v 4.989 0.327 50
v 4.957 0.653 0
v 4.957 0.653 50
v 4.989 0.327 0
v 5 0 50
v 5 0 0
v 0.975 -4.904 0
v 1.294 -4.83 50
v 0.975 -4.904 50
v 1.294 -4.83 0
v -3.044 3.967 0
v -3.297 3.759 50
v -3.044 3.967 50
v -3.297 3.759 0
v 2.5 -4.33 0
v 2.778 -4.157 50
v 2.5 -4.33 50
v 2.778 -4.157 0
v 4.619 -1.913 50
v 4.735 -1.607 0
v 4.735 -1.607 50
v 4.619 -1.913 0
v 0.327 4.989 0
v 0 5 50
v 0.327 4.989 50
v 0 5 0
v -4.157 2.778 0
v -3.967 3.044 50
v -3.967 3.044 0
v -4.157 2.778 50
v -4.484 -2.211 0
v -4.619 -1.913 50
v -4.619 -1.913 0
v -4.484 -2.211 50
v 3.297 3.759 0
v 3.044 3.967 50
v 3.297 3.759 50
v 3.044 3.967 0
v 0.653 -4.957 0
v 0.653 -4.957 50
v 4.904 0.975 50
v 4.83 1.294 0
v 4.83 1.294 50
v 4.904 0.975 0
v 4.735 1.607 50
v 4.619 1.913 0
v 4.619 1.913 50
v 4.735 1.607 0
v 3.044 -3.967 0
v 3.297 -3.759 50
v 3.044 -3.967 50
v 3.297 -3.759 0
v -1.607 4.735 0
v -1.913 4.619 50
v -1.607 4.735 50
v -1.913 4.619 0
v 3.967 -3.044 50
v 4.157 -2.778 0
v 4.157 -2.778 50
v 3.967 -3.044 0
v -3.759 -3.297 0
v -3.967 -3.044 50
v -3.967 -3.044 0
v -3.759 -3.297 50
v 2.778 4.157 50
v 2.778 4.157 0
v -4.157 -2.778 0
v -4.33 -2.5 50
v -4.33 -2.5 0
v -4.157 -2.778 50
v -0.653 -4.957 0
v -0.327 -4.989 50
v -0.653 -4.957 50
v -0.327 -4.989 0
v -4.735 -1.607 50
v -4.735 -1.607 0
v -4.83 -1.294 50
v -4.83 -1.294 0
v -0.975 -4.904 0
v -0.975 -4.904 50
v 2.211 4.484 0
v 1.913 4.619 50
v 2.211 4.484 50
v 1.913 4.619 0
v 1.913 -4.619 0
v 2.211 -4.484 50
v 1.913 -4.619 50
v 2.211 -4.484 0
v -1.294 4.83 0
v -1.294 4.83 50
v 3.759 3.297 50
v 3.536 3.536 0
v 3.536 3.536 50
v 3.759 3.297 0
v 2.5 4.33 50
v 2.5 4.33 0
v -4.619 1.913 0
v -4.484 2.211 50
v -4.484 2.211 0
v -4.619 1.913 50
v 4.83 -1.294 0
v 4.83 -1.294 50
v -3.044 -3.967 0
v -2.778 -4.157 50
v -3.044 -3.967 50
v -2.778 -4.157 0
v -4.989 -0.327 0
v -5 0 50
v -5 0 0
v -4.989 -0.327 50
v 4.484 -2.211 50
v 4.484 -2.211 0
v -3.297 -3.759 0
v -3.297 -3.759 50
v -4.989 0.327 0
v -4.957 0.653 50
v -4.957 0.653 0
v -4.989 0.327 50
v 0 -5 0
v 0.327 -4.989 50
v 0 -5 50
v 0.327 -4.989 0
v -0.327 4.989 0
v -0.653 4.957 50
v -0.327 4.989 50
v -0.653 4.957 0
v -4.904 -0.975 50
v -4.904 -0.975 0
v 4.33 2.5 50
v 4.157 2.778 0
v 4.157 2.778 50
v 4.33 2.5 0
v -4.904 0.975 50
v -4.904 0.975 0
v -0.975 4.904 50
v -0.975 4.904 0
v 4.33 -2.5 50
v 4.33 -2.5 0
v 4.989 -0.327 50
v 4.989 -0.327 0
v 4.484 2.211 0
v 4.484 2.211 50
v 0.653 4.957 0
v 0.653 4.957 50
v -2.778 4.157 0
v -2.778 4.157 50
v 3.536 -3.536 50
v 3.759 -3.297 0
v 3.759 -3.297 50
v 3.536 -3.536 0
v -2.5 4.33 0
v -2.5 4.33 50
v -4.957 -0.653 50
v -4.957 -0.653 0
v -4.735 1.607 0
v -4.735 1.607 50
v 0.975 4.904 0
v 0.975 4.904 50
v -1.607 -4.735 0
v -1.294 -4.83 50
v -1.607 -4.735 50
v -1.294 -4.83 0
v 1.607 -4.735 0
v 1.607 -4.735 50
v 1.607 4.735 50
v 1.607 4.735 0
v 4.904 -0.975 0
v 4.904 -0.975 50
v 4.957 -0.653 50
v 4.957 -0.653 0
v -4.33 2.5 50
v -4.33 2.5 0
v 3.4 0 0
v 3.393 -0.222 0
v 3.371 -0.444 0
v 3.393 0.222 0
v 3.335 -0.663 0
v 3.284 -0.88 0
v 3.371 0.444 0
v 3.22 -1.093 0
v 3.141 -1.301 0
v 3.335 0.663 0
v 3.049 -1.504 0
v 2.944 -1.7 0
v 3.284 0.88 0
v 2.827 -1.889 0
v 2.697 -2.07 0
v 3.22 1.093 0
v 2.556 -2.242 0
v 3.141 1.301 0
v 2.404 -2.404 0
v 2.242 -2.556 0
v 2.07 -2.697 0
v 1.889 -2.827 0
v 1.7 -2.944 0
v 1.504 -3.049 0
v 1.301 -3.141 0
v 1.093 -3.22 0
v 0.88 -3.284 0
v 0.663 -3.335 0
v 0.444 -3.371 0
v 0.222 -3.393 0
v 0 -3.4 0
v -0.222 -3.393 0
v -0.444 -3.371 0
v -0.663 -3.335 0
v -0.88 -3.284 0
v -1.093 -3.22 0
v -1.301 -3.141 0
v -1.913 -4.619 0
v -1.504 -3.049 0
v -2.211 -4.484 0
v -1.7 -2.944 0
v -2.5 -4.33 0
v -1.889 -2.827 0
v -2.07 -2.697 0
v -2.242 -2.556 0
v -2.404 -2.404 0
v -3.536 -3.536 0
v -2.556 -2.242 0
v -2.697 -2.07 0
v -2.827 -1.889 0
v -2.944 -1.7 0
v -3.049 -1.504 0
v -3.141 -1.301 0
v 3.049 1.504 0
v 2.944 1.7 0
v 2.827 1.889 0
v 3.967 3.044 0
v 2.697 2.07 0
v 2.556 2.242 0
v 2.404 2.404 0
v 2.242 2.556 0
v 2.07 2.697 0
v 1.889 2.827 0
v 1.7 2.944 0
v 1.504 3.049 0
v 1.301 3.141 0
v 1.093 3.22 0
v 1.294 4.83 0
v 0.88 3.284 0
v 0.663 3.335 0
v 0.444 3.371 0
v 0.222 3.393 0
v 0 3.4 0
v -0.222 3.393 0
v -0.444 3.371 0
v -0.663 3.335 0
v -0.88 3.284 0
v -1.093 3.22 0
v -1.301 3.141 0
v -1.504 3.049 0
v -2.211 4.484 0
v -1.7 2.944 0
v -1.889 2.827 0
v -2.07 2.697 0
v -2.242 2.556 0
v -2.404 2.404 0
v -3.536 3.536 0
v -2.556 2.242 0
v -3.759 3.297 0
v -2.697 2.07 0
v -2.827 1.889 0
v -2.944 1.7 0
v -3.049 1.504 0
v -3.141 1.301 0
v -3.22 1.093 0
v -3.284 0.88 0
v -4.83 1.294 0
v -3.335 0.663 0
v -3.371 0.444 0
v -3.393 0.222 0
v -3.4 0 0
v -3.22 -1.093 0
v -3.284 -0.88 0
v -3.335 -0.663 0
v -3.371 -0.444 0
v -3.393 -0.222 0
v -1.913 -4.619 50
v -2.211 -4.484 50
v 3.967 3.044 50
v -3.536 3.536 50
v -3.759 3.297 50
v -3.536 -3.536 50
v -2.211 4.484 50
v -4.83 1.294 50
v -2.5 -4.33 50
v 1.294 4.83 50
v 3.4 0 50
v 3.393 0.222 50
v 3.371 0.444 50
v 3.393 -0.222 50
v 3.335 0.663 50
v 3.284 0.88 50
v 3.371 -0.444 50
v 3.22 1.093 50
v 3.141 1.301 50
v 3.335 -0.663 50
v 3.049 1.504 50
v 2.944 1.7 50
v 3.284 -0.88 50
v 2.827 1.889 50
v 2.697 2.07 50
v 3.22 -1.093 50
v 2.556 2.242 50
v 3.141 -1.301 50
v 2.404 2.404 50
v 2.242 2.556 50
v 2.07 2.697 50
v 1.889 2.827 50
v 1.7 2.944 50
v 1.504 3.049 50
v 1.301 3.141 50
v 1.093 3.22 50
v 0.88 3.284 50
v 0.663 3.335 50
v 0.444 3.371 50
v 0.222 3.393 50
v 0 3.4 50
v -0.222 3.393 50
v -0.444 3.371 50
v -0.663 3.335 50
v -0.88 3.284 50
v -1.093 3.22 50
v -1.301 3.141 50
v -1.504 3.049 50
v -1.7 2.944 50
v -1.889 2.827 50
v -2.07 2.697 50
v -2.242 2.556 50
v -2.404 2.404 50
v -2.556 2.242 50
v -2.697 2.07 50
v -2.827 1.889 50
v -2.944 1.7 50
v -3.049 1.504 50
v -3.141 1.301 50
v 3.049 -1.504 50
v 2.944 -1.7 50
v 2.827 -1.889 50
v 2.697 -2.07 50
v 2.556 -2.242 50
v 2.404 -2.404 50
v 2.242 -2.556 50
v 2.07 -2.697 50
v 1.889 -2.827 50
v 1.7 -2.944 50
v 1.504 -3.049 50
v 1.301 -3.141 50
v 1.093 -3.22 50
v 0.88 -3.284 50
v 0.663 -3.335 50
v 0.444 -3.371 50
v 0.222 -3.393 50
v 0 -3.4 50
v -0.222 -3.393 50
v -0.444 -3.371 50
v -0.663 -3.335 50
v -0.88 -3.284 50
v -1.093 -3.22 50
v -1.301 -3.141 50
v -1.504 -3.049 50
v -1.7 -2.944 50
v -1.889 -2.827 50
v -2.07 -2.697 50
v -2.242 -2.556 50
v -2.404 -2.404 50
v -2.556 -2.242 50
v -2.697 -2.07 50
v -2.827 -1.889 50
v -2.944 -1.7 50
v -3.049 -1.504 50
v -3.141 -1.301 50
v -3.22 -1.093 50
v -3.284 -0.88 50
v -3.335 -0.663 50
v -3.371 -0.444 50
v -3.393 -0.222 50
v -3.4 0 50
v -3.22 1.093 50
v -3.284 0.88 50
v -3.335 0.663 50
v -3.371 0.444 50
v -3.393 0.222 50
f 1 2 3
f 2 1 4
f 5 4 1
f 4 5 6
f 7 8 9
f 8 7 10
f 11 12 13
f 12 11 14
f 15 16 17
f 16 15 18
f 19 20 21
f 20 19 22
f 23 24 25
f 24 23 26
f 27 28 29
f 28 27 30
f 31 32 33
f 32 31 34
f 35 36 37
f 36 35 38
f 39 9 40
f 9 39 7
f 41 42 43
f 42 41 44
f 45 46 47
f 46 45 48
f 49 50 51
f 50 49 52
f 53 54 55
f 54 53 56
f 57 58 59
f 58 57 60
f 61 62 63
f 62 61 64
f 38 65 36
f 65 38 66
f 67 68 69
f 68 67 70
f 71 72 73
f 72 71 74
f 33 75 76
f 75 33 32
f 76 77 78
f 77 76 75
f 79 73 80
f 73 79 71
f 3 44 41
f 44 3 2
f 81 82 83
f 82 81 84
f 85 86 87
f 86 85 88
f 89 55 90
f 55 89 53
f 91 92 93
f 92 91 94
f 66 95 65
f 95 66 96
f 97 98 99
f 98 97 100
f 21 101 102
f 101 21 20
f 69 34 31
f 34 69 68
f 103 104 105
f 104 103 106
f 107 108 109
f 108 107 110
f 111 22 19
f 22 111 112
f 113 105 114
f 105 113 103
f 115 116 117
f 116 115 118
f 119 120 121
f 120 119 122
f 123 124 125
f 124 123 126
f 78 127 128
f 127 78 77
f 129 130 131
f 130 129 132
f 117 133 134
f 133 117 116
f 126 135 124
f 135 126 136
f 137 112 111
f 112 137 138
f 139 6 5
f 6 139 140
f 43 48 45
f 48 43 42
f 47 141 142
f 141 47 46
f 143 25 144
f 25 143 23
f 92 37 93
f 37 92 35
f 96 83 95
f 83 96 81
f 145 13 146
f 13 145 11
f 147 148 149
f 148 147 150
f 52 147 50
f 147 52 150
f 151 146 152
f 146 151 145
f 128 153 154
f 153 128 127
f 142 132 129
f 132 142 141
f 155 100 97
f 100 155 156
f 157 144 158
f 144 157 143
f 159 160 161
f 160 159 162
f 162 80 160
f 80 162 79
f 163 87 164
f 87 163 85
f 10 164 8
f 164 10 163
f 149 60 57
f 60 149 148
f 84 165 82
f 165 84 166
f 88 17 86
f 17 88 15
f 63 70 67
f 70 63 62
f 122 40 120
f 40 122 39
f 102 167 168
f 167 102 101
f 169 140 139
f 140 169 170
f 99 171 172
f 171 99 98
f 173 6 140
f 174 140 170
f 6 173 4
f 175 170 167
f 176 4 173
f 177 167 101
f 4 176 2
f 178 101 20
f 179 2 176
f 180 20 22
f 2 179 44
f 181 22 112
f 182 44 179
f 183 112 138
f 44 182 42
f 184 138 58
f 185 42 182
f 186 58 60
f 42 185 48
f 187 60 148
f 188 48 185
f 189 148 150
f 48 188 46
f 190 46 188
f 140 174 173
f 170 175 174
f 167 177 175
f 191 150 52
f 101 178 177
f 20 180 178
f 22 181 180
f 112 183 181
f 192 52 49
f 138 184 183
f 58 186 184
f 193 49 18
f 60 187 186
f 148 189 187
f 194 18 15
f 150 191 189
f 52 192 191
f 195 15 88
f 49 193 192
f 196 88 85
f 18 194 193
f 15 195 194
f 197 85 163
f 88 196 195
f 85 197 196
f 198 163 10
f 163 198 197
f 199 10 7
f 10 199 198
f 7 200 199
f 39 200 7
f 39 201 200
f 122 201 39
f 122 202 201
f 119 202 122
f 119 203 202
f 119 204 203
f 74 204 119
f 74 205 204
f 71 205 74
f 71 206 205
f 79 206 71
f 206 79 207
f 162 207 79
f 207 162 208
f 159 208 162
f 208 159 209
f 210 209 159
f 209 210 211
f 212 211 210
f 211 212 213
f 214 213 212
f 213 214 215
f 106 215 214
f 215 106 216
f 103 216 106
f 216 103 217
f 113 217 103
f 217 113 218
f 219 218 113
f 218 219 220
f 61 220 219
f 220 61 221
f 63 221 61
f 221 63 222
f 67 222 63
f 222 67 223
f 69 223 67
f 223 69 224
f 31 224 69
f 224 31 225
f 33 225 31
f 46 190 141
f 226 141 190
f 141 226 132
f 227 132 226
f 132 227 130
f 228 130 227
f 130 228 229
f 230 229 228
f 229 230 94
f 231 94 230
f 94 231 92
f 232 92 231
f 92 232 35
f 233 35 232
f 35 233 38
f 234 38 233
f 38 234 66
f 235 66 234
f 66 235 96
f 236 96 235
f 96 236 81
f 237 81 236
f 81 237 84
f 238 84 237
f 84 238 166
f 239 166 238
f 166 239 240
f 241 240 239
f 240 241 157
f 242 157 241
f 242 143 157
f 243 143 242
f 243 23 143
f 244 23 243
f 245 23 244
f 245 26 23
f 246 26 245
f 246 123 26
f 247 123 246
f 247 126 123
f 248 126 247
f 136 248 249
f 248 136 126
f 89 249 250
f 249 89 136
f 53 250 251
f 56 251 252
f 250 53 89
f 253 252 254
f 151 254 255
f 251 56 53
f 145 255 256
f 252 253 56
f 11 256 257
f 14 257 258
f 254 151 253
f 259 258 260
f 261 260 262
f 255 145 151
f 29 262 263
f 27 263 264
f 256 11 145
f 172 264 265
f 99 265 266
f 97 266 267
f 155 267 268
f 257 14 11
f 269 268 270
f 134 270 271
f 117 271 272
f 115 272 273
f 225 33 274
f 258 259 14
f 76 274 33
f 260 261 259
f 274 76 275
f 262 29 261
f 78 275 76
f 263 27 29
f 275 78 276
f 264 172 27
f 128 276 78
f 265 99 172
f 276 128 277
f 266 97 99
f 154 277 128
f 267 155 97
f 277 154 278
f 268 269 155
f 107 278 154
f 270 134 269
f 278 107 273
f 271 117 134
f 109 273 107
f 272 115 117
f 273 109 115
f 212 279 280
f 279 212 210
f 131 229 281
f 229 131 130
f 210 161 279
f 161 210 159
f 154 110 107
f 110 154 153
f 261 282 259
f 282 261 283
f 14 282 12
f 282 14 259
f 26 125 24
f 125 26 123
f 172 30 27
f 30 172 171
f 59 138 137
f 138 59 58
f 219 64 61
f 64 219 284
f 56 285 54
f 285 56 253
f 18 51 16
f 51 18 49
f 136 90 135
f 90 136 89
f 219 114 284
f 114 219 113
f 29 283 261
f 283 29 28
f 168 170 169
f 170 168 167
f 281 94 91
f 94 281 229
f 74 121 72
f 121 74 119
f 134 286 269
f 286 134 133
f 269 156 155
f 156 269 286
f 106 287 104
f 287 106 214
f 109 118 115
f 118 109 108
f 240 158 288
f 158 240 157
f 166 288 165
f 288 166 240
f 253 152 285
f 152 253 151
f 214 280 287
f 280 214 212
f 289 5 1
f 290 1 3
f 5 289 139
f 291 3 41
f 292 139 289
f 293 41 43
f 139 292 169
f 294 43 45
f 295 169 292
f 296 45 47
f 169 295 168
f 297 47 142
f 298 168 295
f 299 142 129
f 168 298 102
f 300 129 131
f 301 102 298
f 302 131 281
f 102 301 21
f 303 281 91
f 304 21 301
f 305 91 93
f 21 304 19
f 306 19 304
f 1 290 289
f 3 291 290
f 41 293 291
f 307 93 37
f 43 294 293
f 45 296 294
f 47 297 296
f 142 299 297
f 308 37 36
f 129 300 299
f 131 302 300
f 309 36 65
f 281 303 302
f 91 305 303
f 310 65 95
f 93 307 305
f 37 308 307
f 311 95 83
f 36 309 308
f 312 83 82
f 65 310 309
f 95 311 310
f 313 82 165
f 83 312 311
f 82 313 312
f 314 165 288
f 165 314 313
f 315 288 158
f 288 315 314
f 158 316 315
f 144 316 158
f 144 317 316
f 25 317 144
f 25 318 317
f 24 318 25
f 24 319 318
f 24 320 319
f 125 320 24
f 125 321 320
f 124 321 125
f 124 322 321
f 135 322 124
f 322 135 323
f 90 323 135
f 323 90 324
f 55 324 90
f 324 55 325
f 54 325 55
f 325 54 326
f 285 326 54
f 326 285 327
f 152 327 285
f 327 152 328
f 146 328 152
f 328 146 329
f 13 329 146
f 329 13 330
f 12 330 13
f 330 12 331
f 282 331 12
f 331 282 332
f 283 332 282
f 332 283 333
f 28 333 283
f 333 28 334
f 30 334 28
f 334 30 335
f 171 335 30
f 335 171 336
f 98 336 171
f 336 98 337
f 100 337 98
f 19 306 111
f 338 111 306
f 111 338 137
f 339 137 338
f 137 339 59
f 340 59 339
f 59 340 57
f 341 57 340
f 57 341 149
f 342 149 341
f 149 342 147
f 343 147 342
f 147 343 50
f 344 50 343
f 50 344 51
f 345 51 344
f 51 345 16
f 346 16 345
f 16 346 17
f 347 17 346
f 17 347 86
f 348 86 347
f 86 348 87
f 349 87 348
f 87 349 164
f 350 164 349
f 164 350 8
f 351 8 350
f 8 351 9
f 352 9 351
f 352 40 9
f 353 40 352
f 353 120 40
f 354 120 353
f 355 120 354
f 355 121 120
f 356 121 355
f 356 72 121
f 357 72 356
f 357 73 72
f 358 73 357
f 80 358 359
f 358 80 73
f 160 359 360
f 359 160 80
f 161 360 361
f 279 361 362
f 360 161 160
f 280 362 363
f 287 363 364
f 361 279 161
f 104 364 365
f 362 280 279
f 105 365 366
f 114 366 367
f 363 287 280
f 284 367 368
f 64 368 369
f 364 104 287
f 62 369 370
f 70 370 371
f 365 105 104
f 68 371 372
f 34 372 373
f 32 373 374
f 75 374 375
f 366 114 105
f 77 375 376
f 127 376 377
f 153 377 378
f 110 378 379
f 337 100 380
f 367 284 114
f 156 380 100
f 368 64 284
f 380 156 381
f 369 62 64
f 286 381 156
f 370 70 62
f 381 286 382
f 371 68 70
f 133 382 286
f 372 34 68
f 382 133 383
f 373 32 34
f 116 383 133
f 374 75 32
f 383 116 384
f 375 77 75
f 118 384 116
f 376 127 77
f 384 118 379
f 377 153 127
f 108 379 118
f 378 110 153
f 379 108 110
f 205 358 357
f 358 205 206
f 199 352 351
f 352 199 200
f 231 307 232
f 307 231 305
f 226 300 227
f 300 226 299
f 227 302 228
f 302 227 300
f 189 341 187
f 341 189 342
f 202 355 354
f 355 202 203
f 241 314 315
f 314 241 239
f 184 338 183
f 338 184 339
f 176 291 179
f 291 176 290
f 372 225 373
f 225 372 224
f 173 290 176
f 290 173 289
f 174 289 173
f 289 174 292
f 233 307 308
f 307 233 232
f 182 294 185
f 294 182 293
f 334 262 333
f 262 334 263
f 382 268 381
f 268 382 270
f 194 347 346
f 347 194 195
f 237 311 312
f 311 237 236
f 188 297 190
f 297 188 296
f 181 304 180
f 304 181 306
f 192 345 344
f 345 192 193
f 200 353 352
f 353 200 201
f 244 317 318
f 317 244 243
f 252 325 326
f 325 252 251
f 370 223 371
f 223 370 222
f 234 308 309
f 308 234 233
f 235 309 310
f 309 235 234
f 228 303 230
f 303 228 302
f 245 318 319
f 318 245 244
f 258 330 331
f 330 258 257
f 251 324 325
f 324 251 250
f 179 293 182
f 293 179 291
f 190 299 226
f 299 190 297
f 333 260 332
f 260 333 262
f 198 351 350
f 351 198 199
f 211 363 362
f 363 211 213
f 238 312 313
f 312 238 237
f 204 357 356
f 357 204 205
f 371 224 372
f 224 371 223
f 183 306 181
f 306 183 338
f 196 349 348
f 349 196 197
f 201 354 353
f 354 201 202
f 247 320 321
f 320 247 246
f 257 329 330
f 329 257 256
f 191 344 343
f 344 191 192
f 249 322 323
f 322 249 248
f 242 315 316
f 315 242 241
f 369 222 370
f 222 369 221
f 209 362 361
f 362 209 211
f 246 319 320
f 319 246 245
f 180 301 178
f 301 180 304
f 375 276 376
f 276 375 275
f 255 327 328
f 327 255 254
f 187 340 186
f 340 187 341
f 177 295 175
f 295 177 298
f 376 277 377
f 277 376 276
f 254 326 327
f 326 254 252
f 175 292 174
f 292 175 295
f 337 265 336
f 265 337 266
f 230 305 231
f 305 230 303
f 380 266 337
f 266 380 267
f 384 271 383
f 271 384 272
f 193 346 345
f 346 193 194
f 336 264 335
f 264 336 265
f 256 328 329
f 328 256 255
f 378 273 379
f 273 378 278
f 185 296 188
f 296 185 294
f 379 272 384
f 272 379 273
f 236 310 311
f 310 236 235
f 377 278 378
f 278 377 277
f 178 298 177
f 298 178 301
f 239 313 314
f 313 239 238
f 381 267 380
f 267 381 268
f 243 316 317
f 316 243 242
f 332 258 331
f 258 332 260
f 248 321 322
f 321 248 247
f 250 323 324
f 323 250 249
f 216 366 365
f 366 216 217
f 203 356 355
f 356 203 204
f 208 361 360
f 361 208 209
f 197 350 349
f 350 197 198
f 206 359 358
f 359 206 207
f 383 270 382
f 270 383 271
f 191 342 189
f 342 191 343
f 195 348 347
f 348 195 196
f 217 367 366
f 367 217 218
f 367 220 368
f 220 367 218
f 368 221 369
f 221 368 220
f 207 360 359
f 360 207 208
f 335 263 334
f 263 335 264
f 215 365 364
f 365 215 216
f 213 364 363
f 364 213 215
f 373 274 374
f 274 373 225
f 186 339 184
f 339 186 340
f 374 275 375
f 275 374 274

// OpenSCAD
// Funnel - printed upright, open top and bottom
// Units: mm

$fn = 96;

// ---- Spout ----
spout_d      = 10;     // spout outer diameter
spout_bore   = 6.8;    // spout bore (through)
spout_len    = 20;     // spout length (z = 0 to 20)

// ---- Cone ----
cone_d0      = 10;     // cone outer diameter at z = 20
cone_d1      = 60;     // cone outer diameter at rim (z = 50)
cone_h       = 30;     // cone height (z = 20 to 50)

// ---- Wall ----
wall         = 1.6;    // wall thickness everywhere

// ---- Derived ----
cone_d0_in   = cone_d0 - 2 * wall;   // cone inner diameter at z = 20
cone_d1_in   = cone_d1 - 2 * wall;   // cone inner diameter at rim
eps          = 0.5;                  // cutter overshoot past faces

difference() {
    union() {
        // Spout
        cylinder(d = spout_d, h = spout_len);
        // Cone
        translate([0, 0, spout_len])
            linear_extrude(cone_h)
                circle(d = cone_d0);
        translate([0, 0, spout_len + cone_h])
            linear_extrude(-cone_h)
                circle(d = cone_d1);
    }
    // Through-bore: spout bore up to z = 20, then cone bore (open top)
    translate([0, 0, -eps])
        cylinder(d = spout_bore, h = spout_len + 2 * eps);
    translate([0, 0, spout_len - eps])
        linear_extrude(cone_h + 2 * eps)
            circle(d = cone_d0_in);
}
